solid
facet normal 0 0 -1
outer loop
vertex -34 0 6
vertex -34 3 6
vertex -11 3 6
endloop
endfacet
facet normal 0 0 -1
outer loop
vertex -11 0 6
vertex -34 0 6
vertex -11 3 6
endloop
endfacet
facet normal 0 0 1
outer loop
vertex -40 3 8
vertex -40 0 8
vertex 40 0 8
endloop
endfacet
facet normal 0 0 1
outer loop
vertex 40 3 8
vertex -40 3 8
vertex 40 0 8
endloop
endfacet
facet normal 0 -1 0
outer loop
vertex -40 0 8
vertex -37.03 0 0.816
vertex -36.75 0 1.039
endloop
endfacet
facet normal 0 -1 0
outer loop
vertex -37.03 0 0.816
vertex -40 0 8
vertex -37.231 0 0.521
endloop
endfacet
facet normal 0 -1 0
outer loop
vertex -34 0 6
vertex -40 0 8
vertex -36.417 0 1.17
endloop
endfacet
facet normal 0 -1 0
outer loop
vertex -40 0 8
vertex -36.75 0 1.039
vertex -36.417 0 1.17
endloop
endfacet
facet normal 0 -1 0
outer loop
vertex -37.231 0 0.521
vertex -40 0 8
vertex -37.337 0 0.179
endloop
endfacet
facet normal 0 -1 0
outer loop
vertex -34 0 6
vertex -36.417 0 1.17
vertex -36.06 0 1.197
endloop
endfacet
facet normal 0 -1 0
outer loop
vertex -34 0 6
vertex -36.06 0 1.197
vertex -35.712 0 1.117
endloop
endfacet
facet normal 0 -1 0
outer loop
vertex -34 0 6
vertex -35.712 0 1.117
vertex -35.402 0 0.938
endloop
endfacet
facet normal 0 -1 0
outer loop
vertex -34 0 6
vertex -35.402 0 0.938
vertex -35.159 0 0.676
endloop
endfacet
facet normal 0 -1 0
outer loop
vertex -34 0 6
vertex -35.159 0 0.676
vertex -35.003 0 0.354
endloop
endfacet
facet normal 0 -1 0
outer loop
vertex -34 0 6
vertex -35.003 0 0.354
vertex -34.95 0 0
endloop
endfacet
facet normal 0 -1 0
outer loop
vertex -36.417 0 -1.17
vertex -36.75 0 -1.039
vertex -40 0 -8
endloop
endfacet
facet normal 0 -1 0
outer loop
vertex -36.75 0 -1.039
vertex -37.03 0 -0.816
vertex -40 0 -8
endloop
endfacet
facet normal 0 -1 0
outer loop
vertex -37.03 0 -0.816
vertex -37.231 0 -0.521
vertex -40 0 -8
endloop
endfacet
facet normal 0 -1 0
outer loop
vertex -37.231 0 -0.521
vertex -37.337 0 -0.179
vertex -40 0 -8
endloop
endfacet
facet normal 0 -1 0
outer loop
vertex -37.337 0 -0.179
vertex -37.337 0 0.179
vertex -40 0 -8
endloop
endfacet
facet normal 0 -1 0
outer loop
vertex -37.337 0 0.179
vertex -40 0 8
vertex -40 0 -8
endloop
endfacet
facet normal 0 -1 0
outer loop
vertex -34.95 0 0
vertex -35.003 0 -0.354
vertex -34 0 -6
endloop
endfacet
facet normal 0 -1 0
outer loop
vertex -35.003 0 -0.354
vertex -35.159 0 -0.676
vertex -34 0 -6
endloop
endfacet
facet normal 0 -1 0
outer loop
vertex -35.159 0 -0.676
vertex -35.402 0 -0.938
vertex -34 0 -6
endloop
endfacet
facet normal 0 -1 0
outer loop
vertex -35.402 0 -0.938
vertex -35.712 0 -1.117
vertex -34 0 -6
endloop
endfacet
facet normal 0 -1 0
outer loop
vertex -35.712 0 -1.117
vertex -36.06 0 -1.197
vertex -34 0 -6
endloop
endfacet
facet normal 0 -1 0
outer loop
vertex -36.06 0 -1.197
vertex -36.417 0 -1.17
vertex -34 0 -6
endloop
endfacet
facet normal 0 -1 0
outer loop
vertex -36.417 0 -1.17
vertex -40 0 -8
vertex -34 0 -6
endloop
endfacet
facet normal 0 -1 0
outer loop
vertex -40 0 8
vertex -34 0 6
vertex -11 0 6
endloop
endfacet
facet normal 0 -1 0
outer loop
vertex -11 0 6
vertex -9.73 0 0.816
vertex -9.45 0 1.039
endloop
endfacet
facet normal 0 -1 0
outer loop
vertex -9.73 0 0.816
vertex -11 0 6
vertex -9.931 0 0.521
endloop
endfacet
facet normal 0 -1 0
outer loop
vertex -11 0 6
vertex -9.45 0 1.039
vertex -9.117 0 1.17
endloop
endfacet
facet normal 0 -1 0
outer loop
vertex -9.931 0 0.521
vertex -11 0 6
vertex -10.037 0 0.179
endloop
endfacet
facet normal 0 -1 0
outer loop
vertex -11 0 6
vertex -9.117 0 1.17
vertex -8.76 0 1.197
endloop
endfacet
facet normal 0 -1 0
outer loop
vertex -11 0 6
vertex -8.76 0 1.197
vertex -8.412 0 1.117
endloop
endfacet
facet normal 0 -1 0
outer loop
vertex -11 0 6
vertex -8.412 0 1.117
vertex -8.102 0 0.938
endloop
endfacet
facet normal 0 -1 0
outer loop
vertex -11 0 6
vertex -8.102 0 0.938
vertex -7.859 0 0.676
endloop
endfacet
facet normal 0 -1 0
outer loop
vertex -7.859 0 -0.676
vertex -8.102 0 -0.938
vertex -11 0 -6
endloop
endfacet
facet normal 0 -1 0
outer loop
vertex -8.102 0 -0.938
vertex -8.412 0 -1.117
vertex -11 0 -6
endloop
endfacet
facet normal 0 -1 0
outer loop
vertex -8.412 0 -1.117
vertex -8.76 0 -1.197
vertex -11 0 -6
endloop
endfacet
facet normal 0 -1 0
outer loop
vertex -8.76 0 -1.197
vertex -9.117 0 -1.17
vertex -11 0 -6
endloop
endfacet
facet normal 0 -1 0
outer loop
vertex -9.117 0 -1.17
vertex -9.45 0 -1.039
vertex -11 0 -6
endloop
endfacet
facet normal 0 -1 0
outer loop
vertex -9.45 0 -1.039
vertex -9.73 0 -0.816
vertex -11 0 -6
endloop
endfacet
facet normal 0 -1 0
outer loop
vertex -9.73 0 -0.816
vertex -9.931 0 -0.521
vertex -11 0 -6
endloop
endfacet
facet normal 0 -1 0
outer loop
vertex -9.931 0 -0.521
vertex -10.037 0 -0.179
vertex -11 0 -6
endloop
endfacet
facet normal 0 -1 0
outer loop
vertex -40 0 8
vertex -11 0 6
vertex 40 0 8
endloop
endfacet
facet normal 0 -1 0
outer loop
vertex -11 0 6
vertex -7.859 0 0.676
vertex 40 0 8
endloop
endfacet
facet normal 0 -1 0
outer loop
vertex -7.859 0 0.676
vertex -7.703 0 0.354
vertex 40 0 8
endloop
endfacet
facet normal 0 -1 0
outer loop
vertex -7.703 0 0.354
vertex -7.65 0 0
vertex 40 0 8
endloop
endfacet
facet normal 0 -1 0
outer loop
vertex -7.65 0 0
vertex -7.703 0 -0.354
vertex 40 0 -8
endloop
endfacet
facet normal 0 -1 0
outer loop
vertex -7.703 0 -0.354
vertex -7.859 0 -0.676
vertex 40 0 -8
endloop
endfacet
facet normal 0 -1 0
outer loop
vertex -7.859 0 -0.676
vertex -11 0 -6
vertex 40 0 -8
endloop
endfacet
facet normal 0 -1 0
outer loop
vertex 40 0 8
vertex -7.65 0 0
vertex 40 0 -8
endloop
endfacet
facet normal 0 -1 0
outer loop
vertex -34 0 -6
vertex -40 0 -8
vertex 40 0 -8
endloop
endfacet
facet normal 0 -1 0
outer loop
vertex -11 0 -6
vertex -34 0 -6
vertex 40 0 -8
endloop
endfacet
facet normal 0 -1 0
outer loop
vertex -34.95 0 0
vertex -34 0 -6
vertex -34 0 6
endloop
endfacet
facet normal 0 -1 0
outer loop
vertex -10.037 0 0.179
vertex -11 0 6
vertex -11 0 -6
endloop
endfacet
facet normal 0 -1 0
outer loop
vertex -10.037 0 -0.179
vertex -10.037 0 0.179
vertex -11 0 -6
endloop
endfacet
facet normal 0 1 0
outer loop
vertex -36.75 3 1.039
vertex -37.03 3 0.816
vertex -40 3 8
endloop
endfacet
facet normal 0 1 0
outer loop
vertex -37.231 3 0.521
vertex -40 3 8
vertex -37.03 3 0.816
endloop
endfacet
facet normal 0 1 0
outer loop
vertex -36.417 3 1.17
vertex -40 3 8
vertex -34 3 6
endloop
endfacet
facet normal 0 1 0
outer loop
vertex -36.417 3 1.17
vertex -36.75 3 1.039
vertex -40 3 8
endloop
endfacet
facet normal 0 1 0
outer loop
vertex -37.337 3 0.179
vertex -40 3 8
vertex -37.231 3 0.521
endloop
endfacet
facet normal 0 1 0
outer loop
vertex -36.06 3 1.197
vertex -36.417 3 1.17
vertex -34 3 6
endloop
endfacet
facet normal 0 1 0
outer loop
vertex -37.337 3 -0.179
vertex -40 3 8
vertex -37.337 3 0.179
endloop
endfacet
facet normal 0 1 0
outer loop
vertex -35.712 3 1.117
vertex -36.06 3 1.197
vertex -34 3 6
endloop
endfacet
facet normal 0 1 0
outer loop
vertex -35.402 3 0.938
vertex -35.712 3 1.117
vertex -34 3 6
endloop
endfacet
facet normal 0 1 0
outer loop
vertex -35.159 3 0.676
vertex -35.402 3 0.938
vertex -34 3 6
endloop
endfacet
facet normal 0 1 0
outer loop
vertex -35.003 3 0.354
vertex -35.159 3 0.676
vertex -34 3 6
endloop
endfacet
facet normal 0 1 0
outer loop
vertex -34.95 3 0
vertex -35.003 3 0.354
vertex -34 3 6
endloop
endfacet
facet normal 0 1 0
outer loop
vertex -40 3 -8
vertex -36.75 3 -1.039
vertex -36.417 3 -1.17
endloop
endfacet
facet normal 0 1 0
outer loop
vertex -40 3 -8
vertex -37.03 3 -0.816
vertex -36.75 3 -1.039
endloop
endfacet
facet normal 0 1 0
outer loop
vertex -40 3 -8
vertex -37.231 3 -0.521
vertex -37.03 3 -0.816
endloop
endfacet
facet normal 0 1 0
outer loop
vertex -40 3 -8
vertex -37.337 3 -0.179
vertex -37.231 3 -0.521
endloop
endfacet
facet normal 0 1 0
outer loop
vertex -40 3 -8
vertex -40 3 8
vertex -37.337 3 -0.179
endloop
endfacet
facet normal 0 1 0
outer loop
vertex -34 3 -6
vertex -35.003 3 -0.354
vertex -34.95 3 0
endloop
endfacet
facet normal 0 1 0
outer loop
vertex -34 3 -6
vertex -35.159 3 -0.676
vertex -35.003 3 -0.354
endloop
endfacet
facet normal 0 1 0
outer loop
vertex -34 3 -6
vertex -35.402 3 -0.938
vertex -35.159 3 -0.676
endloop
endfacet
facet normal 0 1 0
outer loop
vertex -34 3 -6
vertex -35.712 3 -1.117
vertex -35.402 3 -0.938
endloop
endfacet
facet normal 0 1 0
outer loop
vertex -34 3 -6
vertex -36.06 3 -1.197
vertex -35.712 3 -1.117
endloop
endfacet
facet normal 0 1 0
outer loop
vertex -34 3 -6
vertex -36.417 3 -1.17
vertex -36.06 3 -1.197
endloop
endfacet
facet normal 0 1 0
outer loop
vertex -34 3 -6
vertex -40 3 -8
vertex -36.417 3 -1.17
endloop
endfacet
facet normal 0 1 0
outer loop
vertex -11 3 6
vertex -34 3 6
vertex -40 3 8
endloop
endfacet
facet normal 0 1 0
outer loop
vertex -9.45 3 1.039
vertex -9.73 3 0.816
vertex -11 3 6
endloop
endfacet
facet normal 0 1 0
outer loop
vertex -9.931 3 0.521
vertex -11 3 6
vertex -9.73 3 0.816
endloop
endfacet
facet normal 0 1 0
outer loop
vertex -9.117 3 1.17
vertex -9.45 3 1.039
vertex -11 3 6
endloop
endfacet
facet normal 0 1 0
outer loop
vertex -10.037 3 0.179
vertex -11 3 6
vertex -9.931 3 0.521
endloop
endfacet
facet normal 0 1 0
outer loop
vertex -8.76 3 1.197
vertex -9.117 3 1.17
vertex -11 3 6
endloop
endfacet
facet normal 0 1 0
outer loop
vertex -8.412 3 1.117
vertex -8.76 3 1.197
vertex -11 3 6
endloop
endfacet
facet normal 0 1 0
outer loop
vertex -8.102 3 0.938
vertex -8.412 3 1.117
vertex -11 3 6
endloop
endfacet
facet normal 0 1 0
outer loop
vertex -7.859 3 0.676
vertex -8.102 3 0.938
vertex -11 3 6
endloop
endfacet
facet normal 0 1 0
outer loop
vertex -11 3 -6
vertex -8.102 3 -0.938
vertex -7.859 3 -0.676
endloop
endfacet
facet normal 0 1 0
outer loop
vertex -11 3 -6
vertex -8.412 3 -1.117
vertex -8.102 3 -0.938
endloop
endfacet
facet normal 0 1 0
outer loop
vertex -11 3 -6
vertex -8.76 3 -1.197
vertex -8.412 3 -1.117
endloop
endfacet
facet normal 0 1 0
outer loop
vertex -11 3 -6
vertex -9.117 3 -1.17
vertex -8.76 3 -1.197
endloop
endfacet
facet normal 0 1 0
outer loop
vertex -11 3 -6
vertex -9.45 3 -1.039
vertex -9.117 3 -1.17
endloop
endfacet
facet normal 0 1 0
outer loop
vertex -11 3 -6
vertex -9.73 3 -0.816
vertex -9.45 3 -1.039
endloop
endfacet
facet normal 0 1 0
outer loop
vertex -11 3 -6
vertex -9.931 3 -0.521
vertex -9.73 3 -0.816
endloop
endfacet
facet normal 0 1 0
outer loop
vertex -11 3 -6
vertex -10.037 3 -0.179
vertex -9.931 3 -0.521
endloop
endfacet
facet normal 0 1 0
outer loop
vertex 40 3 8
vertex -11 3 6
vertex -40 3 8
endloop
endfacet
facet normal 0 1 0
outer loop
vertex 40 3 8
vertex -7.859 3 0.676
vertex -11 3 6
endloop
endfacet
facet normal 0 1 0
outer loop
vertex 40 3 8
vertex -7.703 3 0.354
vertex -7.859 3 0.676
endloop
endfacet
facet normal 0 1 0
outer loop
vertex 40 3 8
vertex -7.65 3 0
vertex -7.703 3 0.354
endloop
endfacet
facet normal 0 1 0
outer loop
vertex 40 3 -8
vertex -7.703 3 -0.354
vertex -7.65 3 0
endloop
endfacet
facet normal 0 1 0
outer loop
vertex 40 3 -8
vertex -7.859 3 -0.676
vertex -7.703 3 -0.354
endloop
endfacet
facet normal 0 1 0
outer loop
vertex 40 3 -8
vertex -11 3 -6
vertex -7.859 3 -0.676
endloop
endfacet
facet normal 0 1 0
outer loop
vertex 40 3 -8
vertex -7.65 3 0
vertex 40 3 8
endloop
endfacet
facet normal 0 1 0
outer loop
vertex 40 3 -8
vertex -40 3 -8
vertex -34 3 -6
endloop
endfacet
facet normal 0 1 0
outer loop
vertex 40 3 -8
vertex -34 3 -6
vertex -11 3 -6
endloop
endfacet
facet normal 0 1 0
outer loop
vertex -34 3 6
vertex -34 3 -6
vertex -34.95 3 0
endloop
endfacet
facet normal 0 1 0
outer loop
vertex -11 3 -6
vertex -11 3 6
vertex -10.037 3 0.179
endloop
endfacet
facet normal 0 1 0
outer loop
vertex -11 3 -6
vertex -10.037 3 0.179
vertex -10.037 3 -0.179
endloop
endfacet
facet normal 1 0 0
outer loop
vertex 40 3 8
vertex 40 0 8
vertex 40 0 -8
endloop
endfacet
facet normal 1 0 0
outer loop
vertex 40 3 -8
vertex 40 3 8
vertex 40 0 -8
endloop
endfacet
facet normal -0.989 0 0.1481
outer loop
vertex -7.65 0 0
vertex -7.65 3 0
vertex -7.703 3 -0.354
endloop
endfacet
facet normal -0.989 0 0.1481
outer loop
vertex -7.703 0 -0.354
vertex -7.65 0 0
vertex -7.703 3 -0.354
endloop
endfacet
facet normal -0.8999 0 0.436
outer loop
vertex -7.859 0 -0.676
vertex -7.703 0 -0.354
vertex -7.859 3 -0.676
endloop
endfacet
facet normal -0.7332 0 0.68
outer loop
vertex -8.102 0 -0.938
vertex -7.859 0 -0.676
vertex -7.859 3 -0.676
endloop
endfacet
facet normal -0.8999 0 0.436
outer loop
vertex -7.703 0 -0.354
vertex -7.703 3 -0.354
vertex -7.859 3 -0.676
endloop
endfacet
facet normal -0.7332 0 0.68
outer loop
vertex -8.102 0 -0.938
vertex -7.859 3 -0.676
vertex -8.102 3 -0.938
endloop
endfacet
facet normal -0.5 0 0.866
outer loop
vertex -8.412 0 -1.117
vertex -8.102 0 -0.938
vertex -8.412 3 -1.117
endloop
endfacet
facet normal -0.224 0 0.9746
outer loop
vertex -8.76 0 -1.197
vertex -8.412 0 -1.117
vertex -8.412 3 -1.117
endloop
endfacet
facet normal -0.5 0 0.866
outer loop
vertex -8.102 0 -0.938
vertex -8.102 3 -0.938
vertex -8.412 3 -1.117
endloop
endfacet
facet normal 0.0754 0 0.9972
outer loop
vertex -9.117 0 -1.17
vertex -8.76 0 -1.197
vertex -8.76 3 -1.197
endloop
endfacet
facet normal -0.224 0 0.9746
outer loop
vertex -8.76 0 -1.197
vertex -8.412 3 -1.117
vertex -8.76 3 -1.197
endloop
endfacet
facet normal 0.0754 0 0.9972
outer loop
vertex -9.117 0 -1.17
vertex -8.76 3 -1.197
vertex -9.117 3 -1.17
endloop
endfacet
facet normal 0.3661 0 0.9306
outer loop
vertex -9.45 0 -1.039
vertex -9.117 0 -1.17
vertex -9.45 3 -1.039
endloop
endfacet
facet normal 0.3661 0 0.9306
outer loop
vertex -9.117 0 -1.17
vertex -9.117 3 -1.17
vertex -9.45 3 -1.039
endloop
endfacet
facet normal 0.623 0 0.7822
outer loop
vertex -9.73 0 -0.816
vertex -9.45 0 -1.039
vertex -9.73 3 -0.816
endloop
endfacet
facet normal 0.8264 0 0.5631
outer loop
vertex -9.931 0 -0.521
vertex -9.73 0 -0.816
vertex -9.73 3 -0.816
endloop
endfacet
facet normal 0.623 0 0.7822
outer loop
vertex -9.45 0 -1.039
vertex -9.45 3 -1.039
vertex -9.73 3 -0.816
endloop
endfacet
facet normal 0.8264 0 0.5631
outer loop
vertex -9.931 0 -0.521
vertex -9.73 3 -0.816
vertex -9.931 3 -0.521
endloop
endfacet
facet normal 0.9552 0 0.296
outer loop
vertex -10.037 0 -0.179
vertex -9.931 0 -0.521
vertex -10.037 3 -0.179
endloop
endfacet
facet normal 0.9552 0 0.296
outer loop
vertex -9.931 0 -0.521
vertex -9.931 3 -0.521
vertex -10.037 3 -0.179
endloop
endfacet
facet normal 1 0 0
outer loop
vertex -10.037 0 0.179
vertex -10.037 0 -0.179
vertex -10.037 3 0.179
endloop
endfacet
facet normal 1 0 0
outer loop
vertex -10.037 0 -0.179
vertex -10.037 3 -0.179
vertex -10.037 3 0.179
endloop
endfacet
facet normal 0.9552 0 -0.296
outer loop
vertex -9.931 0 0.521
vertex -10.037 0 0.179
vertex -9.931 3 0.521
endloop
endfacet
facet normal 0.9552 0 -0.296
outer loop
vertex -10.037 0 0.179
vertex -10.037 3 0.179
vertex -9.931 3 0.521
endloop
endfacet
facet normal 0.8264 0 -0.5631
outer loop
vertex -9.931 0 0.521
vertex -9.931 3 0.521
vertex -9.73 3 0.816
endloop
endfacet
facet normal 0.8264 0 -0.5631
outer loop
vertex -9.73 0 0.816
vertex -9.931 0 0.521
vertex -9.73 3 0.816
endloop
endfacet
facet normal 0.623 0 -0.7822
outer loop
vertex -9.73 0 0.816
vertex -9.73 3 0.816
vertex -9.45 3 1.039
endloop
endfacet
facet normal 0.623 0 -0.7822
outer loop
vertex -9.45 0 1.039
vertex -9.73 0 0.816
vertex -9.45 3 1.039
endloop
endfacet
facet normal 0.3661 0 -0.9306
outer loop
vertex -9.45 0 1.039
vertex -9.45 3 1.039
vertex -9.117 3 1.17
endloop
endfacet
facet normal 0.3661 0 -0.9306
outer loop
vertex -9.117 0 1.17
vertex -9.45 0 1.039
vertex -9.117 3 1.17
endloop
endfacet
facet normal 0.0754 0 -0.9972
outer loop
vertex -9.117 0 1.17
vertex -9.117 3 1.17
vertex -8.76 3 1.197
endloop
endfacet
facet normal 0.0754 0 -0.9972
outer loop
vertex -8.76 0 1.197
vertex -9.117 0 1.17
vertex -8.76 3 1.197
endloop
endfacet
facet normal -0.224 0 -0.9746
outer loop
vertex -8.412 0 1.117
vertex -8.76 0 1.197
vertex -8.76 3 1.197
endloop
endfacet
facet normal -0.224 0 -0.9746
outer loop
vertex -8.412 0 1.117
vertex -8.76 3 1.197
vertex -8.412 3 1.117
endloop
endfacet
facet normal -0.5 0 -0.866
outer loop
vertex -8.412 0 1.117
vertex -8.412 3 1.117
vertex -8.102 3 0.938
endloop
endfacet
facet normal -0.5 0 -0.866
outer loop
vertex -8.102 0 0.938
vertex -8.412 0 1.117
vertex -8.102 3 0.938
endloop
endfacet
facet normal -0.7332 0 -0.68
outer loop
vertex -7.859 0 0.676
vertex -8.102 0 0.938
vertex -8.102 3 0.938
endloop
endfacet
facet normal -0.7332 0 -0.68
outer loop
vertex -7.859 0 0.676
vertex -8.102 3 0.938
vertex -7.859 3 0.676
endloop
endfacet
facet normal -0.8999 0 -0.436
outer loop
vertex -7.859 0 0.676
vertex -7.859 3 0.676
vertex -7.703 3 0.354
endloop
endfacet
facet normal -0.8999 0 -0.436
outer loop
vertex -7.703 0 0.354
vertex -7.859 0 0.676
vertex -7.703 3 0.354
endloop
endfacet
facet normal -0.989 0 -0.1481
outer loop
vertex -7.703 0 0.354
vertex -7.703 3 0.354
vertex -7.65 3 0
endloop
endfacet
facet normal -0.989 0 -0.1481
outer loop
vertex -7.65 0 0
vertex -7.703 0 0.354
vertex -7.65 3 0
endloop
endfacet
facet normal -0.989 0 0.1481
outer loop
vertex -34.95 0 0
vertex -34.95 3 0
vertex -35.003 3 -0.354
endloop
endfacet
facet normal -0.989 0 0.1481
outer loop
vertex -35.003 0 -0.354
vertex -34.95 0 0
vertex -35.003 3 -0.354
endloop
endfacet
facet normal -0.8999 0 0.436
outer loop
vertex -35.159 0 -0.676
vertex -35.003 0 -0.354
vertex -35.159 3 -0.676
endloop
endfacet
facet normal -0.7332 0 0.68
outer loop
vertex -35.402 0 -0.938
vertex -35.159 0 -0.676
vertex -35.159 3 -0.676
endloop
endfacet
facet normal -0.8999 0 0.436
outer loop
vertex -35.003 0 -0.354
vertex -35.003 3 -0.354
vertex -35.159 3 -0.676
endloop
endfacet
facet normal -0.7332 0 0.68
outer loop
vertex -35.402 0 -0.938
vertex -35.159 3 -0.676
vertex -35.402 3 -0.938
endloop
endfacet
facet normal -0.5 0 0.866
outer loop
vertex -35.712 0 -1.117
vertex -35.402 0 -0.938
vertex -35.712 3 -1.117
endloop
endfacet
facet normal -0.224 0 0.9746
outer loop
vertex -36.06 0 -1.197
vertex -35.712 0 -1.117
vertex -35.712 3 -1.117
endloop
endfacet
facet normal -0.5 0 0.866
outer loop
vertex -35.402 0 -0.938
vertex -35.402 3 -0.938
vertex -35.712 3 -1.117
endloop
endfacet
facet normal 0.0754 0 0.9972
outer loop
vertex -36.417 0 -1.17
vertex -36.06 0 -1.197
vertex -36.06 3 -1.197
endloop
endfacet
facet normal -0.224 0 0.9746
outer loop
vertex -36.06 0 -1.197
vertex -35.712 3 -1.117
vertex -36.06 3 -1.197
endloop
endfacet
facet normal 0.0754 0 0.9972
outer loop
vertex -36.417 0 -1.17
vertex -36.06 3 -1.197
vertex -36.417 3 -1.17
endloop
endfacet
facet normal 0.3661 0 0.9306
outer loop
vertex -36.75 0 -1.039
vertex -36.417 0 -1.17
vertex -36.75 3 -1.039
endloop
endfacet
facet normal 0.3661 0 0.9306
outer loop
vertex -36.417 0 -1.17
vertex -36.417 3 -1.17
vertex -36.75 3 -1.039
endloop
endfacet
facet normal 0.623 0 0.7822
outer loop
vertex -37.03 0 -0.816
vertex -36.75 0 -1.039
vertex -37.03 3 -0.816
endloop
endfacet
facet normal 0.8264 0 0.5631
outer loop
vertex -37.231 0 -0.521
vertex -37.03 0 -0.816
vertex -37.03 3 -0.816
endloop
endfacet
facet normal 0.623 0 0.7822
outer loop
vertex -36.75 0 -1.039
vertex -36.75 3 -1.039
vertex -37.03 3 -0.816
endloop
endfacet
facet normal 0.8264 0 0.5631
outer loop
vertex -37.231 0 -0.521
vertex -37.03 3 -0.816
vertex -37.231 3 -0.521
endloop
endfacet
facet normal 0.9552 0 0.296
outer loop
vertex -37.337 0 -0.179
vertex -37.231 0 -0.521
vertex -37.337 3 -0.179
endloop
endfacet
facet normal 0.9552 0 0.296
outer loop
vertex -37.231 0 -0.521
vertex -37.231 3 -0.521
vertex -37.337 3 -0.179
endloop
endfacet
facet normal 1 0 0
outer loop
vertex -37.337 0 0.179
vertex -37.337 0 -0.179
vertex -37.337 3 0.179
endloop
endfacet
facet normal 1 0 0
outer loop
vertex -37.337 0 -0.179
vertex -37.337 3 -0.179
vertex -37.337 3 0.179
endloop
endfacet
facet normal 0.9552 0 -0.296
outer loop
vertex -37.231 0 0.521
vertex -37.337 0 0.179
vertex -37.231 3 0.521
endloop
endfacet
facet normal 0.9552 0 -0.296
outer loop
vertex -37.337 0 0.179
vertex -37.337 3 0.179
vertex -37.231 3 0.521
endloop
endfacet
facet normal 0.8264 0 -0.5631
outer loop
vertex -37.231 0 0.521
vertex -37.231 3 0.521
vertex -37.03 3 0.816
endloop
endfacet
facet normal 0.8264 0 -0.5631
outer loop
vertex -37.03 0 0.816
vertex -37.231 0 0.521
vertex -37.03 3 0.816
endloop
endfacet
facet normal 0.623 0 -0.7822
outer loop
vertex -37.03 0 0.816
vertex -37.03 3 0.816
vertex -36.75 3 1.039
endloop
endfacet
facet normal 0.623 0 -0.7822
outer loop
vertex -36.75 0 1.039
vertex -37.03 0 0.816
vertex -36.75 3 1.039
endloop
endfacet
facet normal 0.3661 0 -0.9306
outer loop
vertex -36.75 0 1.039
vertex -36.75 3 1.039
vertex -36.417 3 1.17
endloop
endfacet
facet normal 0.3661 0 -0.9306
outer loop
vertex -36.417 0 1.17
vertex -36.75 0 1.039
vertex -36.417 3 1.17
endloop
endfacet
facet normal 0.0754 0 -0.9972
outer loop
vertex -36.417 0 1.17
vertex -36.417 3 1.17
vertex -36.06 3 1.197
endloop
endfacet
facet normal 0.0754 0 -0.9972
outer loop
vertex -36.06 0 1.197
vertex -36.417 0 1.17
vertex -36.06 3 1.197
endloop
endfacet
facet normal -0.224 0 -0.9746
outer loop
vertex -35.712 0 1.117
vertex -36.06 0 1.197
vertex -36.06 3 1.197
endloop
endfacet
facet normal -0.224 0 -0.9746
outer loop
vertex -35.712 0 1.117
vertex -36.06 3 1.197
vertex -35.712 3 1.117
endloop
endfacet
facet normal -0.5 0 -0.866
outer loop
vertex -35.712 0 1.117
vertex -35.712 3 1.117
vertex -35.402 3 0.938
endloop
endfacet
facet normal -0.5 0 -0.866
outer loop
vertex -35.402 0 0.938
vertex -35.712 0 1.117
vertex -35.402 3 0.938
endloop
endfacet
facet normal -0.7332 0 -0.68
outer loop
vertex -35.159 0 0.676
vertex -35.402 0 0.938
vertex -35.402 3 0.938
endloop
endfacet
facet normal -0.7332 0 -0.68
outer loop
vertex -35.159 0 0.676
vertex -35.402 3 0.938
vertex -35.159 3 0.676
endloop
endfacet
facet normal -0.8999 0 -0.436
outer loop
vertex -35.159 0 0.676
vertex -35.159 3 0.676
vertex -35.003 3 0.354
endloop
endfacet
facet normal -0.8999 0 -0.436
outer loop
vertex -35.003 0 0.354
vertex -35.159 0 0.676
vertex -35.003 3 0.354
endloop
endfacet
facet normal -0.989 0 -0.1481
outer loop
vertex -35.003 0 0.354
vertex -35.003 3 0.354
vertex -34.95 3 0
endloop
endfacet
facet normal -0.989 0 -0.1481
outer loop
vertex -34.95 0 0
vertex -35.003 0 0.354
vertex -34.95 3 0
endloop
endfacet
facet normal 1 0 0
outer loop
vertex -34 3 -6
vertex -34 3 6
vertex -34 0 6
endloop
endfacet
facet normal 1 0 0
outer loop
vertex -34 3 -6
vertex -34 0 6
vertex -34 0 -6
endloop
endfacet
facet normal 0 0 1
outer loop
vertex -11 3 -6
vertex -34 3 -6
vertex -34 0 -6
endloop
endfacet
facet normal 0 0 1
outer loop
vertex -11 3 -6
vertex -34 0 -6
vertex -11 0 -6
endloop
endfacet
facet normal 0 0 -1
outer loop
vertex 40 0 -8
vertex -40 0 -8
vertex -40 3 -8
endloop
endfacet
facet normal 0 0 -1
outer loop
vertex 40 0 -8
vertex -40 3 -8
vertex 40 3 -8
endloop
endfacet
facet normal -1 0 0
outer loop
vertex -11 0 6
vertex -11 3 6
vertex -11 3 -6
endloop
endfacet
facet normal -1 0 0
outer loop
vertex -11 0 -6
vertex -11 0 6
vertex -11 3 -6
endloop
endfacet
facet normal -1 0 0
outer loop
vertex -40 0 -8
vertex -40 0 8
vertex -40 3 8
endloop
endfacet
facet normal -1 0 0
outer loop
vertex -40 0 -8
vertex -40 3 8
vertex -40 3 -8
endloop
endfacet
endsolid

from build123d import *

# Parameters (mm, degrees)
SKETCH1_W           = 80
SKETCH1_H           = 16
BOSS_EXTRUDE1_DEPTH = 3
SKETCH2_R           = 1.2
SKETCH2_W           = 23
SKETCH2_H           = 12
CUT_EXTRUDE1_DEPTH  = 4


with BuildPart() as part:
    # Sketch1 → Boss-Extrude1 (new body)
    with BuildSketch(Plane(origin=(0, 0, 0), x_dir=(1, 0, 0), z_dir=(0, 1, 0))):
        Rectangle(SKETCH1_W, SKETCH1_H)
    extrude(amount=BOSS_EXTRUDE1_DEPTH)

    # Sketch2 → Cut-Extrude1 (cut, through all)
    with BuildSketch(Plane(origin=(0, 3, 0), x_dir=(1, 0, 0), z_dir=(0, 1, 0))):
        with Locations((-36.15, 0)):
            Circle(SKETCH2_R)
        with Locations((-8.85, 0)):
            Circle(SKETCH2_R)
        with Locations((-22.5, 0)):
            Rectangle(SKETCH2_W, SKETCH2_H)
    extrude(amount=-CUT_EXTRUDE1_DEPTH, mode=Mode.SUBTRACT)


solid = part.part
